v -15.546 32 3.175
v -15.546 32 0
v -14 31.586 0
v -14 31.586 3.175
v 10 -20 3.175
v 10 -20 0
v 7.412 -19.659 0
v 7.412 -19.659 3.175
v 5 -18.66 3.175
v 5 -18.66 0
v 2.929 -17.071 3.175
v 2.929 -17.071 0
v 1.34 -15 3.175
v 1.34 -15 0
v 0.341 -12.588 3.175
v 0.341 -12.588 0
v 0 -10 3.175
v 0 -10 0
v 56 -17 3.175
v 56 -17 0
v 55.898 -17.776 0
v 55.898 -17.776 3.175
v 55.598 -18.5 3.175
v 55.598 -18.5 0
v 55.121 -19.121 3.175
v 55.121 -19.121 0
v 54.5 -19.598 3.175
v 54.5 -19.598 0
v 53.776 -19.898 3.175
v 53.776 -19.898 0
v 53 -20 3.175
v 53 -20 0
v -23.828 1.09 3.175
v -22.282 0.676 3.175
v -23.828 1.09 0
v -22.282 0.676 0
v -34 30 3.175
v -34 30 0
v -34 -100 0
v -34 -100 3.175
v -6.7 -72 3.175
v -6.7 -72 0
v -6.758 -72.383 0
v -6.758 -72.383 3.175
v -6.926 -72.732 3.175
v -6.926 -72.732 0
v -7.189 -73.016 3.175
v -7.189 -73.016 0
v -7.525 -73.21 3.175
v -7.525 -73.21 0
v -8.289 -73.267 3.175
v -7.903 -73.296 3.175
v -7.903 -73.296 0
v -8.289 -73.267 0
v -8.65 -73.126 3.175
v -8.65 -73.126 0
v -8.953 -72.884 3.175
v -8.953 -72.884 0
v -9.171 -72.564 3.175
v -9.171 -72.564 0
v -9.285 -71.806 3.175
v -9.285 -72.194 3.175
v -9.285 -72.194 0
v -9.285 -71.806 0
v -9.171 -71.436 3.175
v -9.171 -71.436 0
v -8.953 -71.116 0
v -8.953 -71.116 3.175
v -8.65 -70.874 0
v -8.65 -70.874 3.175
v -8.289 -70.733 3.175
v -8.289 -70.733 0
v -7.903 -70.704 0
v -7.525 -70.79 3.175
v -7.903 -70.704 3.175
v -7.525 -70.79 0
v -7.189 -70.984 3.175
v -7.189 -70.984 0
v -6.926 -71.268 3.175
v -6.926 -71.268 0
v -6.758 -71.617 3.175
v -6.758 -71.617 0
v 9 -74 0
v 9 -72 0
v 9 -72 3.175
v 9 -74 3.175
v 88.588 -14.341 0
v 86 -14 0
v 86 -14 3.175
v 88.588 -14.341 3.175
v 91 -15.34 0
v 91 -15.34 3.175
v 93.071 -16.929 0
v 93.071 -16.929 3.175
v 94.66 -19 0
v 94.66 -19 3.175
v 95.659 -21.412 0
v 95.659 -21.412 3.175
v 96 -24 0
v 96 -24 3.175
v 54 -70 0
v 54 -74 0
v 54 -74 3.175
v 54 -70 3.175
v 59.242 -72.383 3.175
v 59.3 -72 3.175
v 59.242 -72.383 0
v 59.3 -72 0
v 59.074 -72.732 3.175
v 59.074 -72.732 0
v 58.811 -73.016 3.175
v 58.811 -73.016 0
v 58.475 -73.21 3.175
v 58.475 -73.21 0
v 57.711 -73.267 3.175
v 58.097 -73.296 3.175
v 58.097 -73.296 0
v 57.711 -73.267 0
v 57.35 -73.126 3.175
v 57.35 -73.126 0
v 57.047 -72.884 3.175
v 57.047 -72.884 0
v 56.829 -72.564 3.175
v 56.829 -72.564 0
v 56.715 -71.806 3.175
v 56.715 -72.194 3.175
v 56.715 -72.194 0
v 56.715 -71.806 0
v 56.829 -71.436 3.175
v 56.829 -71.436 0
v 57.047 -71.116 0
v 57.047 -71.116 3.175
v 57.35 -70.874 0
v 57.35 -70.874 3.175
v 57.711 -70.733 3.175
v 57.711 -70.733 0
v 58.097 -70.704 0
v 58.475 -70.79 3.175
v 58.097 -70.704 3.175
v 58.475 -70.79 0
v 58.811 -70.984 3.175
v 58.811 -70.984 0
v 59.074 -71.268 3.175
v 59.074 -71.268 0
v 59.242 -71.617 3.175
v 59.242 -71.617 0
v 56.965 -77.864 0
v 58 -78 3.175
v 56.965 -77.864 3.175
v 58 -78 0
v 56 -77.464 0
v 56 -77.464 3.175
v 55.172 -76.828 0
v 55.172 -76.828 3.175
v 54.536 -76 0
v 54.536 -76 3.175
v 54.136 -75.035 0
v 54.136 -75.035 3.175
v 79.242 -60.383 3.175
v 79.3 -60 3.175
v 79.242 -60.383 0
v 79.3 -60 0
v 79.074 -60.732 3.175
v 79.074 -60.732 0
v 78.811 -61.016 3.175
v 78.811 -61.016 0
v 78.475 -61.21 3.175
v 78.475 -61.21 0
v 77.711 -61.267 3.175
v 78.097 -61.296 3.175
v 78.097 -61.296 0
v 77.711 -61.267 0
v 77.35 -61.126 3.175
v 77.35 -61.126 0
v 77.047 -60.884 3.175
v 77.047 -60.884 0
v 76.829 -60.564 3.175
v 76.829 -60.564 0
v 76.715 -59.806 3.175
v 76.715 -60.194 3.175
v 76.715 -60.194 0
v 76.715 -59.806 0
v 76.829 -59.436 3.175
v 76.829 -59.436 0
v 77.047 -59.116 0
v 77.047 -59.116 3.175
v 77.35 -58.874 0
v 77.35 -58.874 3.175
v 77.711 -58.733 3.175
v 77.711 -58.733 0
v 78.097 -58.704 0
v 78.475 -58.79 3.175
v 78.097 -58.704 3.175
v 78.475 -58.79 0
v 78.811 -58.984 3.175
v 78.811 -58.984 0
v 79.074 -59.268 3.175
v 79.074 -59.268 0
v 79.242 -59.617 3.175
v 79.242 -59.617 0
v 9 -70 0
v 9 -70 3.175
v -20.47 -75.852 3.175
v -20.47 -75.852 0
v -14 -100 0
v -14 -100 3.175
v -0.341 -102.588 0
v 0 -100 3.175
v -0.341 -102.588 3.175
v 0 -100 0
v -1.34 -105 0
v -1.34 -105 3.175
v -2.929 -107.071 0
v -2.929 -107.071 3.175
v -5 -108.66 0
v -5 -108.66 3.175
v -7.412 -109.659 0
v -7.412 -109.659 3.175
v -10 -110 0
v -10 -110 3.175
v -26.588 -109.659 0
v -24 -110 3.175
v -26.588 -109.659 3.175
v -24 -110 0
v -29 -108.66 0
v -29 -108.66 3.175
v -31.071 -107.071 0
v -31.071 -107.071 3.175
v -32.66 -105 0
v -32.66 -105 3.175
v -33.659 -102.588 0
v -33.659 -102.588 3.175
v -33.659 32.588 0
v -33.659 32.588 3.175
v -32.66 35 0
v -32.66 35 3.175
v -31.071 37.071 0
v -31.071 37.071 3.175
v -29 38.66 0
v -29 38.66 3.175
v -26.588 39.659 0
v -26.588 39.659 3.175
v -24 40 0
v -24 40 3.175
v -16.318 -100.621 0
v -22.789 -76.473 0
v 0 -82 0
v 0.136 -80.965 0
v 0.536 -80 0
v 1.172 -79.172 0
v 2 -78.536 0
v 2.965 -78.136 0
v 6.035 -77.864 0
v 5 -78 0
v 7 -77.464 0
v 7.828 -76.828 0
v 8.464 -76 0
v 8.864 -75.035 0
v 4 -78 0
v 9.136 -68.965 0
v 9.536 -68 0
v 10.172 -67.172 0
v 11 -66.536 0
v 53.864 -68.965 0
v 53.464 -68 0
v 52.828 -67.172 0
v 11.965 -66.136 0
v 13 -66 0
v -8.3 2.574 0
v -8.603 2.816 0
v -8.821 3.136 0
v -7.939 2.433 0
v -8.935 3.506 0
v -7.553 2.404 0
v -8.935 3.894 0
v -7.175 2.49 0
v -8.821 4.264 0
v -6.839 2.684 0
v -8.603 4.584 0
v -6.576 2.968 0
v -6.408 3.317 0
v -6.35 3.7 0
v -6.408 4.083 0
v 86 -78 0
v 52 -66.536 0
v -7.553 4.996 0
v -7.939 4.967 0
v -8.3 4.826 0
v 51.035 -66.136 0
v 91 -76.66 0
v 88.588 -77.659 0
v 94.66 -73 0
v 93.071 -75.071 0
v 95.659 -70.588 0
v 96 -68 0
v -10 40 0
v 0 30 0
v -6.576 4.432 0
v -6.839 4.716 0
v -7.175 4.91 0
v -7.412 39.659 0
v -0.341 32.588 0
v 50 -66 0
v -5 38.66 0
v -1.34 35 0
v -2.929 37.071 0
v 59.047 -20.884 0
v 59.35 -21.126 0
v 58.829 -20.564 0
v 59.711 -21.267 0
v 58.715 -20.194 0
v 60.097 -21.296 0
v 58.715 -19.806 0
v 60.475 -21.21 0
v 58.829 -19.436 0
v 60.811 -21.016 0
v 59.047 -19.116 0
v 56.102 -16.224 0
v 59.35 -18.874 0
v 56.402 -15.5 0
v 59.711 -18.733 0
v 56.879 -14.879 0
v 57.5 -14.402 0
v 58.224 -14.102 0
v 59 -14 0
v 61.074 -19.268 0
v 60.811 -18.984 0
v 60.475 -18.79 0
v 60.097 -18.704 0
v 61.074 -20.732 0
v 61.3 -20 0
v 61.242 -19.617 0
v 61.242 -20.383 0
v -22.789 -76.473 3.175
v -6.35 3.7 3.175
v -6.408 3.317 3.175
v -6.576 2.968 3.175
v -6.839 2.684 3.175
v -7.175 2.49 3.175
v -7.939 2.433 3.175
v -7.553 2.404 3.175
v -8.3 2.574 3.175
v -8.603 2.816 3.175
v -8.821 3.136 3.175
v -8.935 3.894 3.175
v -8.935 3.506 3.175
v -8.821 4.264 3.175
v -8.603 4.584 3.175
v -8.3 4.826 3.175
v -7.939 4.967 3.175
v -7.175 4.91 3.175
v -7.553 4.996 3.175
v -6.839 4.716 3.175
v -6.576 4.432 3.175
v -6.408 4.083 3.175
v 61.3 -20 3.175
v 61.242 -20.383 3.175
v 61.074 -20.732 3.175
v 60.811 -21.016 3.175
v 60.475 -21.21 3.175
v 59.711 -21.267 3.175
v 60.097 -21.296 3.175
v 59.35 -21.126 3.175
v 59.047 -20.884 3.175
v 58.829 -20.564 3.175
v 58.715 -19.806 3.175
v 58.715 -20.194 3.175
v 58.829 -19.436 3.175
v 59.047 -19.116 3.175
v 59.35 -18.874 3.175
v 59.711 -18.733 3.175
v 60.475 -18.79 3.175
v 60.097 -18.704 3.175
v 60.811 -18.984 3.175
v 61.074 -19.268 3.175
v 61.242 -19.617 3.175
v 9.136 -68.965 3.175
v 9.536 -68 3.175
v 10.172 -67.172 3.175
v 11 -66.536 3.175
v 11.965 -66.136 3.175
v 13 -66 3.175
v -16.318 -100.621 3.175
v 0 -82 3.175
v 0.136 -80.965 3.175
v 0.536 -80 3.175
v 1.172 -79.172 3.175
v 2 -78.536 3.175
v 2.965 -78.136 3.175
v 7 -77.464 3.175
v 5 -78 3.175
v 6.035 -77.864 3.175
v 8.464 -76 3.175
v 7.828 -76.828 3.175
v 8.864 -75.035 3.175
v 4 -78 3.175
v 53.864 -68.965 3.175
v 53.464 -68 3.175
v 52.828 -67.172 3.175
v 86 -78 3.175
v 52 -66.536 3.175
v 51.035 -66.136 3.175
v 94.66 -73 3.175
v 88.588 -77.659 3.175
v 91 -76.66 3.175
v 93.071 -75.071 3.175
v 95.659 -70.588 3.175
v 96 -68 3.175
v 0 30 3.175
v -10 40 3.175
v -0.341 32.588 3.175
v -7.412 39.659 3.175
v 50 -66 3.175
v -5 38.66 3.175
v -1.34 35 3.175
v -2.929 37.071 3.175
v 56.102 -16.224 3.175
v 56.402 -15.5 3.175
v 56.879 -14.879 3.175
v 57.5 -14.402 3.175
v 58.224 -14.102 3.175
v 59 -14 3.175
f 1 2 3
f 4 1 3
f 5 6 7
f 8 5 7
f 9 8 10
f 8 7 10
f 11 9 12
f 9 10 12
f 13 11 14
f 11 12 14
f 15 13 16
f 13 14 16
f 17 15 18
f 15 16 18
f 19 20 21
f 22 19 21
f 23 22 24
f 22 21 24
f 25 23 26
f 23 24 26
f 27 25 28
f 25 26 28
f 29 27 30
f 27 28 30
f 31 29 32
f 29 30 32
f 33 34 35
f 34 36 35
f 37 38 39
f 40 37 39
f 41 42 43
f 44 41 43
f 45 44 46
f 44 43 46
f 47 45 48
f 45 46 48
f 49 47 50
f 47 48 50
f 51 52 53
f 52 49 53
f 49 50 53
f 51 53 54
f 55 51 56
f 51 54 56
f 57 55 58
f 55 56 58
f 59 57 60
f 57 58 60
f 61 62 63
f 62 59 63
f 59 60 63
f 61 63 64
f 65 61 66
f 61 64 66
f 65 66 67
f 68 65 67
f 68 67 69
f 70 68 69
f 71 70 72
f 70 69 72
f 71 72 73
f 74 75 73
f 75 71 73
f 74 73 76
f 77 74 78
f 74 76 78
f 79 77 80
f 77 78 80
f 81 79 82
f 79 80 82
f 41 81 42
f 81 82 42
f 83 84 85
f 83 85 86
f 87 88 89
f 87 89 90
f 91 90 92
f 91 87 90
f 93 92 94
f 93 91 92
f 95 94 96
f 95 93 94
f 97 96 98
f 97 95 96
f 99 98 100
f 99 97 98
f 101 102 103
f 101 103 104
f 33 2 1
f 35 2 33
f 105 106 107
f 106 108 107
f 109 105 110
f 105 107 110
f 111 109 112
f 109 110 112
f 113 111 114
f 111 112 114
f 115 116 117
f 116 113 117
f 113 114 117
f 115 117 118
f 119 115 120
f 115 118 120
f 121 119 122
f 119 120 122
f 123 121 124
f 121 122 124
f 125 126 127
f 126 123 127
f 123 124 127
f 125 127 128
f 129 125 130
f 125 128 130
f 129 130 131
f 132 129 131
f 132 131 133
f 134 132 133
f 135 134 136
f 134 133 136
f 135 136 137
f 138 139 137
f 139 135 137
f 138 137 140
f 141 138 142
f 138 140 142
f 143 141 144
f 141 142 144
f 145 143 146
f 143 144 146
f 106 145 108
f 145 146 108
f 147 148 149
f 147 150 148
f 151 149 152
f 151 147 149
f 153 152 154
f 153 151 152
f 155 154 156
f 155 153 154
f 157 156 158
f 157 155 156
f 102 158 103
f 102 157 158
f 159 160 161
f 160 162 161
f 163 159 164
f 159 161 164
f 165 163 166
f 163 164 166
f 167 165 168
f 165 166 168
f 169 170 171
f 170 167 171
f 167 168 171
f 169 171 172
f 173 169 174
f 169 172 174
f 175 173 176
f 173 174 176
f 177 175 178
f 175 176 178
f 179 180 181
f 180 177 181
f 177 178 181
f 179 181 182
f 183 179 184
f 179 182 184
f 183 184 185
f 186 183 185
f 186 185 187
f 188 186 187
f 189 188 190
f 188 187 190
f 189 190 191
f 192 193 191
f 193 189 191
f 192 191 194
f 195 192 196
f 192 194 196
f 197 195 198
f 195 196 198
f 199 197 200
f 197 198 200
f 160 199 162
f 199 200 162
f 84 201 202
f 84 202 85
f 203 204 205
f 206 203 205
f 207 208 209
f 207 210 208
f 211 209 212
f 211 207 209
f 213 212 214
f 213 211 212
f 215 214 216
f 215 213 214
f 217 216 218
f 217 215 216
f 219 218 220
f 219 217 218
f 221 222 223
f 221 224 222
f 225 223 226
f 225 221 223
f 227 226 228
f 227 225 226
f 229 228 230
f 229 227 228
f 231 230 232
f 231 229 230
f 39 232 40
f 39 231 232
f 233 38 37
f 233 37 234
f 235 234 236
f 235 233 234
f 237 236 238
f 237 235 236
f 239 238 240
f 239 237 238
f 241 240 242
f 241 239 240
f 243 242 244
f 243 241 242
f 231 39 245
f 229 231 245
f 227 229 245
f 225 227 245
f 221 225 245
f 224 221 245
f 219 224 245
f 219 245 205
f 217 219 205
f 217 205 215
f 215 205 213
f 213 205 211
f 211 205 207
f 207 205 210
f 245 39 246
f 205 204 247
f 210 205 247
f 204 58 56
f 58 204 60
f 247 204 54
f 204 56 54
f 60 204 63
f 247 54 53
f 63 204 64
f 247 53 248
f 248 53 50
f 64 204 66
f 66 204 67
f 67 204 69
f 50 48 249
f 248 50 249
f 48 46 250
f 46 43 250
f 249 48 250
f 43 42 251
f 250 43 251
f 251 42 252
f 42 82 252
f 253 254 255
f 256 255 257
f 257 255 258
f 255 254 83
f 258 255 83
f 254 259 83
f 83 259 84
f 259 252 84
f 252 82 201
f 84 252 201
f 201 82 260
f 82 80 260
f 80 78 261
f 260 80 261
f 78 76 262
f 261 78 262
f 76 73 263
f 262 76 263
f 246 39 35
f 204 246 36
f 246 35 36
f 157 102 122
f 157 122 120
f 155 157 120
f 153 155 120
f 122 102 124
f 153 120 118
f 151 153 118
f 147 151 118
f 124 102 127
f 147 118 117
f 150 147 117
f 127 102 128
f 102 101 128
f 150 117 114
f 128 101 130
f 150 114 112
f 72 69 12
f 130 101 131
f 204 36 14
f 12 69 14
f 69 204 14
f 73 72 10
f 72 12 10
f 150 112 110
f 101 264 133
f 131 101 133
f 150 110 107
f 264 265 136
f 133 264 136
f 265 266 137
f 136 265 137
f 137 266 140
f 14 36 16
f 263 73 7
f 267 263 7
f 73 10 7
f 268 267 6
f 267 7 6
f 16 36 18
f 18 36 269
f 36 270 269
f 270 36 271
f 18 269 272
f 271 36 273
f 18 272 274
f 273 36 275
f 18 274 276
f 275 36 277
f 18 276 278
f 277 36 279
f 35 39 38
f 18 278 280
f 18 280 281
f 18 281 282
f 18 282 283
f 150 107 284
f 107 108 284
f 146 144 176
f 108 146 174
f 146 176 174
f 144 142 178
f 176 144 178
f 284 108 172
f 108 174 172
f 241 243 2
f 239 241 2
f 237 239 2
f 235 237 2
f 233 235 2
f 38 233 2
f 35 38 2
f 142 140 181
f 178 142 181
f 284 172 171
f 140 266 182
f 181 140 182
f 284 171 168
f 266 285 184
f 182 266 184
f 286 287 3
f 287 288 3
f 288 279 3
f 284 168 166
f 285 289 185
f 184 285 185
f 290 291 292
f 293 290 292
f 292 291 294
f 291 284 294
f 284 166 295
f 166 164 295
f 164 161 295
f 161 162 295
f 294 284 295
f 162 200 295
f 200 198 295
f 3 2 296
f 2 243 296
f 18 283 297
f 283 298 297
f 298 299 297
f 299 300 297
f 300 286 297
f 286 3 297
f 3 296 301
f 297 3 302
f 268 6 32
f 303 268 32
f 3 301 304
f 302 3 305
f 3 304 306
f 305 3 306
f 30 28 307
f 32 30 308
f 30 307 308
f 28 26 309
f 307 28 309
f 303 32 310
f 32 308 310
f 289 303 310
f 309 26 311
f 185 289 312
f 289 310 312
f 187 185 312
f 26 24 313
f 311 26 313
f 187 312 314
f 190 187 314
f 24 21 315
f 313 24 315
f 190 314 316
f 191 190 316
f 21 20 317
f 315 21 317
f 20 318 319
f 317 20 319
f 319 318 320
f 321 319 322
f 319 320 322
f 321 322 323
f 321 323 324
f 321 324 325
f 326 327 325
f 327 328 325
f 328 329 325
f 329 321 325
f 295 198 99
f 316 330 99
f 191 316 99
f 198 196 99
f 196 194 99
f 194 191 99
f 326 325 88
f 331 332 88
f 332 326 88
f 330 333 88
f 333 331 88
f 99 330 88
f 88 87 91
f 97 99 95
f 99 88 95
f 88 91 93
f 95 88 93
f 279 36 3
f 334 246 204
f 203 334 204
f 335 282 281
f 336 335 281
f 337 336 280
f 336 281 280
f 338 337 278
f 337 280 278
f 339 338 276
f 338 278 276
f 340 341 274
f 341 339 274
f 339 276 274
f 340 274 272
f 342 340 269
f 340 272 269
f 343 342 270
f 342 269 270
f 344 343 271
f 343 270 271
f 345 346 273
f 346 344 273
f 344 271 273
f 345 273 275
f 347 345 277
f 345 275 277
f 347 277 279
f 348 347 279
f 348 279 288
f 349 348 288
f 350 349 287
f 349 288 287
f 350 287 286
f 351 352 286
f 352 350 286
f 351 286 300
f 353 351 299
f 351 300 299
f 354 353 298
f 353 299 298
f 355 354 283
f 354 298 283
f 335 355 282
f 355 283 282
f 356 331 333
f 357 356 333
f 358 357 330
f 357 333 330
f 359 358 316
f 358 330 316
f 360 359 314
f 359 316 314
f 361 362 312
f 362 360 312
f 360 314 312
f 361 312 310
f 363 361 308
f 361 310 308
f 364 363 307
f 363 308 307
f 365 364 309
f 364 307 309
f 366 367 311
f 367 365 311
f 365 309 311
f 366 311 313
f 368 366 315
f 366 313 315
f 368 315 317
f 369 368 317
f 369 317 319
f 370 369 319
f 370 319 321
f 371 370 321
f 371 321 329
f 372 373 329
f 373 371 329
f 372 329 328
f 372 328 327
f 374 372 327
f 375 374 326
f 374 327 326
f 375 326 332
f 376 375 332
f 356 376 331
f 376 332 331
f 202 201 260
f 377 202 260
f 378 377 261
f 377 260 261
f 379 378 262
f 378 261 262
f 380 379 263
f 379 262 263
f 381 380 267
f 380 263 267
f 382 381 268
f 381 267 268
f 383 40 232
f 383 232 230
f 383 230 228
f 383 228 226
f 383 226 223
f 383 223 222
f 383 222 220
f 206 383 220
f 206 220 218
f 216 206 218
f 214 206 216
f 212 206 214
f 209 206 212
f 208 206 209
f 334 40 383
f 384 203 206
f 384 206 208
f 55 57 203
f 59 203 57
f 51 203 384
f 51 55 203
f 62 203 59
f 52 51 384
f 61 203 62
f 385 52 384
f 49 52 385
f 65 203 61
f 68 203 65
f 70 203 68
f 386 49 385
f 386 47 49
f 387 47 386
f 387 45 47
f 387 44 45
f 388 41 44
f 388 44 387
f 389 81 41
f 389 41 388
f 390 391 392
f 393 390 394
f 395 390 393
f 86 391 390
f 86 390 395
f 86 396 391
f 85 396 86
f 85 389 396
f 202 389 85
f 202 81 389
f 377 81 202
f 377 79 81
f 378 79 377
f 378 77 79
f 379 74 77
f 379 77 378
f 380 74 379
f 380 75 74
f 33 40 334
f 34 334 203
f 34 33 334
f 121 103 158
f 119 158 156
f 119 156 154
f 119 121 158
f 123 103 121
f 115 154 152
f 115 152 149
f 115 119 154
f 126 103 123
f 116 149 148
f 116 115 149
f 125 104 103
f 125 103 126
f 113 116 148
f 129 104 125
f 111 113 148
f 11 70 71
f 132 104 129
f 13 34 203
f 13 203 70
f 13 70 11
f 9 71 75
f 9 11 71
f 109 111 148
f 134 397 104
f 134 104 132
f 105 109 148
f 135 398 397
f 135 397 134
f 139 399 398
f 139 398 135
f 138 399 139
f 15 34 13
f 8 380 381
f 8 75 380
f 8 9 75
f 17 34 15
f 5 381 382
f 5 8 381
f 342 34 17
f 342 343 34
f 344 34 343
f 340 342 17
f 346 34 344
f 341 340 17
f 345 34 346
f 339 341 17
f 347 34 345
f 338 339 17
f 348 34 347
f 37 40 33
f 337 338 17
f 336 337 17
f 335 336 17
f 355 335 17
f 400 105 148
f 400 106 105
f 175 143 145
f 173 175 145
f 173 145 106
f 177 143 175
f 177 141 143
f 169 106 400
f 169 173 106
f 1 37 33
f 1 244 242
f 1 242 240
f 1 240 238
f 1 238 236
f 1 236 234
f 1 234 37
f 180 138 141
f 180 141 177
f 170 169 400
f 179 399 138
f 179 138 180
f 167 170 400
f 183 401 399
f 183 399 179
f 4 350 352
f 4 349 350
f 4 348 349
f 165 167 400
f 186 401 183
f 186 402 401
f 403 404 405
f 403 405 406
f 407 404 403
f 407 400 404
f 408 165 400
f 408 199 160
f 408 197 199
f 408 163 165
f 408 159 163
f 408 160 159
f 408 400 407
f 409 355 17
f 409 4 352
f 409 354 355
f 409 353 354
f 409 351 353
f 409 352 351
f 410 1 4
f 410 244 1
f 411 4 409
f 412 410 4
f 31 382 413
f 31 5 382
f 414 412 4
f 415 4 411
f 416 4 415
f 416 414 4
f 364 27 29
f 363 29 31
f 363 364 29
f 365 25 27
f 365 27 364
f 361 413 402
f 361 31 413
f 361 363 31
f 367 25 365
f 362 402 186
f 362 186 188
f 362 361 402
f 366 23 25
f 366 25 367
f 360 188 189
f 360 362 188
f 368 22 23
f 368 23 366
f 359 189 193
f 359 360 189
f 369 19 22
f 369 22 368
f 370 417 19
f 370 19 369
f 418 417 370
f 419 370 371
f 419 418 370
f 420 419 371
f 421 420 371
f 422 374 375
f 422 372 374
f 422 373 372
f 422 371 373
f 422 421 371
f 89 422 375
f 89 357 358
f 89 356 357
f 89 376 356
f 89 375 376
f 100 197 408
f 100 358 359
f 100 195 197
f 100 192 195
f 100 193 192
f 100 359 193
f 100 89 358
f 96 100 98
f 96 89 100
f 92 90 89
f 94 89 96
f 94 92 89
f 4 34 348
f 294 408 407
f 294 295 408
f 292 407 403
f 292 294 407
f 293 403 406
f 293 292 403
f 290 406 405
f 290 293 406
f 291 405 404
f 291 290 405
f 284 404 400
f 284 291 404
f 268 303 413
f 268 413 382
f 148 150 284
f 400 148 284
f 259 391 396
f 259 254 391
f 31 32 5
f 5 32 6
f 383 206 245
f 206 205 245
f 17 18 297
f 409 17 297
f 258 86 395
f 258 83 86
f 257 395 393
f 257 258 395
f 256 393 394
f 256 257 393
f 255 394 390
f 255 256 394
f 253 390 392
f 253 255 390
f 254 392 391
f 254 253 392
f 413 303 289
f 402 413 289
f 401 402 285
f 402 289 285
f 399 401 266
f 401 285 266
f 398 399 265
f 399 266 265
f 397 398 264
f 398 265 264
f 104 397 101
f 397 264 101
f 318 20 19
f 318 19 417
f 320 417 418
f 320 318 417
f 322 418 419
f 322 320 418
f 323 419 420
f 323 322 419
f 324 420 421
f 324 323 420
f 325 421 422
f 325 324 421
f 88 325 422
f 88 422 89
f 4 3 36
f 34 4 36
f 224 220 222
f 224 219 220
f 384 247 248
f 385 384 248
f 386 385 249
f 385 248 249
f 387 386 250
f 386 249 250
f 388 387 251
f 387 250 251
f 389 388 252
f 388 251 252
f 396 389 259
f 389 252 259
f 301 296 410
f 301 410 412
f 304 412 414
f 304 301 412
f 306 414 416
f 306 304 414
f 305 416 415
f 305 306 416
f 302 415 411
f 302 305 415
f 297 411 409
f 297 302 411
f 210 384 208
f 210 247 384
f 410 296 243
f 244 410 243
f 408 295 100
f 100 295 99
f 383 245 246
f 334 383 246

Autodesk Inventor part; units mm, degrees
ref_plane "YZ Plane" through (0, 0, 0) normal (1, 0, 0) x (0, 1, 0)
ref_plane "XZ Plane" through (0, 0, 0) normal (0, 1, 0) x (-1, 0, 0)
ref_plane "XY Plane" through (0, 0, 0) normal (0, 0, 1) x (1, 0, 0)
sketch "Sketch1" plane through (0, 0, 0) normal (0, 0, 1) x (1, 0, 0)
  line L0 (-34, 30) -> (-34, -100)
  line L1 (96, -68) -> (96, -24)
  line L2 (0, -10) -> (0, 30)
  line L3 (-10, 40) -> (-24, 40)
  circle A0 centre (78, -60) radius 1.3
  circle A1 centre (-7.65, 3.7) radius 1.3
  arc A2 (-24, 40) -> (-34, 30) centre (-24, 30) ccw
  arc A3 (0, 30) -> (-10, 40) centre (-10, 30) ccw
  arc A4 (86, -78) -> (96, -68) centre (86, -68) ccw
  line L4 (0, -82) -> (0, -100)
  line L5 (-10, -110) -> (-24, -110)
  arc A5 (-10, -110) -> (0, -100) centre (-10, -100) ccw
  arc A6 (-34, -100) -> (-24, -110) centre (-24, -100) ccw
  line L6 (59, -14) -> (86, -14)
  arc A7 (96, -24) -> (86, -14) centre (86, -24) ccw
  line L7 (54, -74) -> (54, -70)
  line L8 (50, -66) -> (13, -66)
  line L9 (9, -70) -> (9, -72)
  line L10 (5, -78) -> (4, -78)
  line L11 (58, -78) -> (86, -78)
  arc A8 (13, -66) -> (9, -70) centre (13, -70) ccw
  arc A9 (54, -74) -> (58, -78) centre (58, -74) ccw
  arc A10 (54, -70) -> (50, -66) centre (50, -70) ccw
  line L12 (-16.3182, -100.6212) -> (-22.7887, -76.473)
  line L13 (-22.7887, -76.473) -> (-20.4705, -75.8519)
  line L14 (-20.4705, -75.8519) -> (-14, -100)
  line L15 (-14, -100) -> (-16.3182, -100.6212)
  line L16 (-10, -100) -> (-24, -100) construction
  line L17 (-34, -35) -> (96, -35) construction
  line L18 (-15.5455, 32) -> (-23.8277, 1.0904)
  line L19 (-15.5455, 32) -> (-14, 31.5859)
  line L20 (-14, 31.5859) -> (-22.2822, 0.6763)
  line L21 (-22.2822, 0.6763) -> (-23.8277, 1.0904)
  line L22 (53, -20) -> (10, -20)
  line L23 (56, -17) -> (56, -17)
  arc A11 (53, -20) -> (56, -17) centre (53, -17) ccw
  arc A12 (59, -14) -> (56, -17) centre (59, -17) ccw
  arc A13 (0, -10) -> (10, -20) centre (10, -10) ccw
  line L24 (-10, 30) -> (-24, 30) construction
  circle A14 centre (60, -20) radius 1.3
  circle A15 centre (58, -72) radius 1.3
  line L25 (9, -72) -> (9, -74)
  arc A16 (5, -78) -> (9, -74) centre (5, -74) ccw
  arc A17 (4, -78) -> (0, -82) centre (4, -82) ccw
  circle A18 centre (-8, -72) radius 1.3
  line L26 (58, -72) -> (-8, -72) construction
  point P0 (0, 0)
  point P1 (-34, 40)
  point P2 (0, 40)
  point P3 (-34, -110)
  point P4 (96, -14)
  point P5 (9, -78)
  point P6 (0, -20)
  point P7 (54, -66)
  point P8 (9, -66)
  dimension "d2" = 2.6
  dimension "d4" = 18
  dimension "d5" = 40
  dimension "d7" = 34
  dimension "d10" = 26.35
  dimension "d14" = 10
  dimension "d23" = 10
  dimension "d25" = 17.7
  dimension "d27" = 45
  dimension "d29" = 64
  dimension "d31" = 32
  dimension "d32" = 12
  dimension "d33" = 130
  dimension "d36" = 4
  dimension "d38" = 2.4
  dimension "d39" = 75
  dimension "d42" = 42
  dimension "d46" = 1.6
  dimension "d48" = 6
  dimension "d49" = 3
  dimension "d50" = 10
  dimension "d51" = 75
  dimension "d52" = 32
  dimension "d55" = 8
  dimension "d56" = 14
  dimension "d57" = 25
  dimension "d58" = 14
  dimension "d59" = 40
  dimension "d60" = 18
  dimension "d61" = 20
  dimension "d62" = 12
  dimension "d63" = 20
  dimension "d64" = 100
  dimension "d65" = 4
  dimension "d66" = 60
  dimension "d67" = 4
  dimension "d68" = 66
extrude "Extrusion1" add sketch "Sketch1" along normal blind 3.175
properties part number "battery_mount"
